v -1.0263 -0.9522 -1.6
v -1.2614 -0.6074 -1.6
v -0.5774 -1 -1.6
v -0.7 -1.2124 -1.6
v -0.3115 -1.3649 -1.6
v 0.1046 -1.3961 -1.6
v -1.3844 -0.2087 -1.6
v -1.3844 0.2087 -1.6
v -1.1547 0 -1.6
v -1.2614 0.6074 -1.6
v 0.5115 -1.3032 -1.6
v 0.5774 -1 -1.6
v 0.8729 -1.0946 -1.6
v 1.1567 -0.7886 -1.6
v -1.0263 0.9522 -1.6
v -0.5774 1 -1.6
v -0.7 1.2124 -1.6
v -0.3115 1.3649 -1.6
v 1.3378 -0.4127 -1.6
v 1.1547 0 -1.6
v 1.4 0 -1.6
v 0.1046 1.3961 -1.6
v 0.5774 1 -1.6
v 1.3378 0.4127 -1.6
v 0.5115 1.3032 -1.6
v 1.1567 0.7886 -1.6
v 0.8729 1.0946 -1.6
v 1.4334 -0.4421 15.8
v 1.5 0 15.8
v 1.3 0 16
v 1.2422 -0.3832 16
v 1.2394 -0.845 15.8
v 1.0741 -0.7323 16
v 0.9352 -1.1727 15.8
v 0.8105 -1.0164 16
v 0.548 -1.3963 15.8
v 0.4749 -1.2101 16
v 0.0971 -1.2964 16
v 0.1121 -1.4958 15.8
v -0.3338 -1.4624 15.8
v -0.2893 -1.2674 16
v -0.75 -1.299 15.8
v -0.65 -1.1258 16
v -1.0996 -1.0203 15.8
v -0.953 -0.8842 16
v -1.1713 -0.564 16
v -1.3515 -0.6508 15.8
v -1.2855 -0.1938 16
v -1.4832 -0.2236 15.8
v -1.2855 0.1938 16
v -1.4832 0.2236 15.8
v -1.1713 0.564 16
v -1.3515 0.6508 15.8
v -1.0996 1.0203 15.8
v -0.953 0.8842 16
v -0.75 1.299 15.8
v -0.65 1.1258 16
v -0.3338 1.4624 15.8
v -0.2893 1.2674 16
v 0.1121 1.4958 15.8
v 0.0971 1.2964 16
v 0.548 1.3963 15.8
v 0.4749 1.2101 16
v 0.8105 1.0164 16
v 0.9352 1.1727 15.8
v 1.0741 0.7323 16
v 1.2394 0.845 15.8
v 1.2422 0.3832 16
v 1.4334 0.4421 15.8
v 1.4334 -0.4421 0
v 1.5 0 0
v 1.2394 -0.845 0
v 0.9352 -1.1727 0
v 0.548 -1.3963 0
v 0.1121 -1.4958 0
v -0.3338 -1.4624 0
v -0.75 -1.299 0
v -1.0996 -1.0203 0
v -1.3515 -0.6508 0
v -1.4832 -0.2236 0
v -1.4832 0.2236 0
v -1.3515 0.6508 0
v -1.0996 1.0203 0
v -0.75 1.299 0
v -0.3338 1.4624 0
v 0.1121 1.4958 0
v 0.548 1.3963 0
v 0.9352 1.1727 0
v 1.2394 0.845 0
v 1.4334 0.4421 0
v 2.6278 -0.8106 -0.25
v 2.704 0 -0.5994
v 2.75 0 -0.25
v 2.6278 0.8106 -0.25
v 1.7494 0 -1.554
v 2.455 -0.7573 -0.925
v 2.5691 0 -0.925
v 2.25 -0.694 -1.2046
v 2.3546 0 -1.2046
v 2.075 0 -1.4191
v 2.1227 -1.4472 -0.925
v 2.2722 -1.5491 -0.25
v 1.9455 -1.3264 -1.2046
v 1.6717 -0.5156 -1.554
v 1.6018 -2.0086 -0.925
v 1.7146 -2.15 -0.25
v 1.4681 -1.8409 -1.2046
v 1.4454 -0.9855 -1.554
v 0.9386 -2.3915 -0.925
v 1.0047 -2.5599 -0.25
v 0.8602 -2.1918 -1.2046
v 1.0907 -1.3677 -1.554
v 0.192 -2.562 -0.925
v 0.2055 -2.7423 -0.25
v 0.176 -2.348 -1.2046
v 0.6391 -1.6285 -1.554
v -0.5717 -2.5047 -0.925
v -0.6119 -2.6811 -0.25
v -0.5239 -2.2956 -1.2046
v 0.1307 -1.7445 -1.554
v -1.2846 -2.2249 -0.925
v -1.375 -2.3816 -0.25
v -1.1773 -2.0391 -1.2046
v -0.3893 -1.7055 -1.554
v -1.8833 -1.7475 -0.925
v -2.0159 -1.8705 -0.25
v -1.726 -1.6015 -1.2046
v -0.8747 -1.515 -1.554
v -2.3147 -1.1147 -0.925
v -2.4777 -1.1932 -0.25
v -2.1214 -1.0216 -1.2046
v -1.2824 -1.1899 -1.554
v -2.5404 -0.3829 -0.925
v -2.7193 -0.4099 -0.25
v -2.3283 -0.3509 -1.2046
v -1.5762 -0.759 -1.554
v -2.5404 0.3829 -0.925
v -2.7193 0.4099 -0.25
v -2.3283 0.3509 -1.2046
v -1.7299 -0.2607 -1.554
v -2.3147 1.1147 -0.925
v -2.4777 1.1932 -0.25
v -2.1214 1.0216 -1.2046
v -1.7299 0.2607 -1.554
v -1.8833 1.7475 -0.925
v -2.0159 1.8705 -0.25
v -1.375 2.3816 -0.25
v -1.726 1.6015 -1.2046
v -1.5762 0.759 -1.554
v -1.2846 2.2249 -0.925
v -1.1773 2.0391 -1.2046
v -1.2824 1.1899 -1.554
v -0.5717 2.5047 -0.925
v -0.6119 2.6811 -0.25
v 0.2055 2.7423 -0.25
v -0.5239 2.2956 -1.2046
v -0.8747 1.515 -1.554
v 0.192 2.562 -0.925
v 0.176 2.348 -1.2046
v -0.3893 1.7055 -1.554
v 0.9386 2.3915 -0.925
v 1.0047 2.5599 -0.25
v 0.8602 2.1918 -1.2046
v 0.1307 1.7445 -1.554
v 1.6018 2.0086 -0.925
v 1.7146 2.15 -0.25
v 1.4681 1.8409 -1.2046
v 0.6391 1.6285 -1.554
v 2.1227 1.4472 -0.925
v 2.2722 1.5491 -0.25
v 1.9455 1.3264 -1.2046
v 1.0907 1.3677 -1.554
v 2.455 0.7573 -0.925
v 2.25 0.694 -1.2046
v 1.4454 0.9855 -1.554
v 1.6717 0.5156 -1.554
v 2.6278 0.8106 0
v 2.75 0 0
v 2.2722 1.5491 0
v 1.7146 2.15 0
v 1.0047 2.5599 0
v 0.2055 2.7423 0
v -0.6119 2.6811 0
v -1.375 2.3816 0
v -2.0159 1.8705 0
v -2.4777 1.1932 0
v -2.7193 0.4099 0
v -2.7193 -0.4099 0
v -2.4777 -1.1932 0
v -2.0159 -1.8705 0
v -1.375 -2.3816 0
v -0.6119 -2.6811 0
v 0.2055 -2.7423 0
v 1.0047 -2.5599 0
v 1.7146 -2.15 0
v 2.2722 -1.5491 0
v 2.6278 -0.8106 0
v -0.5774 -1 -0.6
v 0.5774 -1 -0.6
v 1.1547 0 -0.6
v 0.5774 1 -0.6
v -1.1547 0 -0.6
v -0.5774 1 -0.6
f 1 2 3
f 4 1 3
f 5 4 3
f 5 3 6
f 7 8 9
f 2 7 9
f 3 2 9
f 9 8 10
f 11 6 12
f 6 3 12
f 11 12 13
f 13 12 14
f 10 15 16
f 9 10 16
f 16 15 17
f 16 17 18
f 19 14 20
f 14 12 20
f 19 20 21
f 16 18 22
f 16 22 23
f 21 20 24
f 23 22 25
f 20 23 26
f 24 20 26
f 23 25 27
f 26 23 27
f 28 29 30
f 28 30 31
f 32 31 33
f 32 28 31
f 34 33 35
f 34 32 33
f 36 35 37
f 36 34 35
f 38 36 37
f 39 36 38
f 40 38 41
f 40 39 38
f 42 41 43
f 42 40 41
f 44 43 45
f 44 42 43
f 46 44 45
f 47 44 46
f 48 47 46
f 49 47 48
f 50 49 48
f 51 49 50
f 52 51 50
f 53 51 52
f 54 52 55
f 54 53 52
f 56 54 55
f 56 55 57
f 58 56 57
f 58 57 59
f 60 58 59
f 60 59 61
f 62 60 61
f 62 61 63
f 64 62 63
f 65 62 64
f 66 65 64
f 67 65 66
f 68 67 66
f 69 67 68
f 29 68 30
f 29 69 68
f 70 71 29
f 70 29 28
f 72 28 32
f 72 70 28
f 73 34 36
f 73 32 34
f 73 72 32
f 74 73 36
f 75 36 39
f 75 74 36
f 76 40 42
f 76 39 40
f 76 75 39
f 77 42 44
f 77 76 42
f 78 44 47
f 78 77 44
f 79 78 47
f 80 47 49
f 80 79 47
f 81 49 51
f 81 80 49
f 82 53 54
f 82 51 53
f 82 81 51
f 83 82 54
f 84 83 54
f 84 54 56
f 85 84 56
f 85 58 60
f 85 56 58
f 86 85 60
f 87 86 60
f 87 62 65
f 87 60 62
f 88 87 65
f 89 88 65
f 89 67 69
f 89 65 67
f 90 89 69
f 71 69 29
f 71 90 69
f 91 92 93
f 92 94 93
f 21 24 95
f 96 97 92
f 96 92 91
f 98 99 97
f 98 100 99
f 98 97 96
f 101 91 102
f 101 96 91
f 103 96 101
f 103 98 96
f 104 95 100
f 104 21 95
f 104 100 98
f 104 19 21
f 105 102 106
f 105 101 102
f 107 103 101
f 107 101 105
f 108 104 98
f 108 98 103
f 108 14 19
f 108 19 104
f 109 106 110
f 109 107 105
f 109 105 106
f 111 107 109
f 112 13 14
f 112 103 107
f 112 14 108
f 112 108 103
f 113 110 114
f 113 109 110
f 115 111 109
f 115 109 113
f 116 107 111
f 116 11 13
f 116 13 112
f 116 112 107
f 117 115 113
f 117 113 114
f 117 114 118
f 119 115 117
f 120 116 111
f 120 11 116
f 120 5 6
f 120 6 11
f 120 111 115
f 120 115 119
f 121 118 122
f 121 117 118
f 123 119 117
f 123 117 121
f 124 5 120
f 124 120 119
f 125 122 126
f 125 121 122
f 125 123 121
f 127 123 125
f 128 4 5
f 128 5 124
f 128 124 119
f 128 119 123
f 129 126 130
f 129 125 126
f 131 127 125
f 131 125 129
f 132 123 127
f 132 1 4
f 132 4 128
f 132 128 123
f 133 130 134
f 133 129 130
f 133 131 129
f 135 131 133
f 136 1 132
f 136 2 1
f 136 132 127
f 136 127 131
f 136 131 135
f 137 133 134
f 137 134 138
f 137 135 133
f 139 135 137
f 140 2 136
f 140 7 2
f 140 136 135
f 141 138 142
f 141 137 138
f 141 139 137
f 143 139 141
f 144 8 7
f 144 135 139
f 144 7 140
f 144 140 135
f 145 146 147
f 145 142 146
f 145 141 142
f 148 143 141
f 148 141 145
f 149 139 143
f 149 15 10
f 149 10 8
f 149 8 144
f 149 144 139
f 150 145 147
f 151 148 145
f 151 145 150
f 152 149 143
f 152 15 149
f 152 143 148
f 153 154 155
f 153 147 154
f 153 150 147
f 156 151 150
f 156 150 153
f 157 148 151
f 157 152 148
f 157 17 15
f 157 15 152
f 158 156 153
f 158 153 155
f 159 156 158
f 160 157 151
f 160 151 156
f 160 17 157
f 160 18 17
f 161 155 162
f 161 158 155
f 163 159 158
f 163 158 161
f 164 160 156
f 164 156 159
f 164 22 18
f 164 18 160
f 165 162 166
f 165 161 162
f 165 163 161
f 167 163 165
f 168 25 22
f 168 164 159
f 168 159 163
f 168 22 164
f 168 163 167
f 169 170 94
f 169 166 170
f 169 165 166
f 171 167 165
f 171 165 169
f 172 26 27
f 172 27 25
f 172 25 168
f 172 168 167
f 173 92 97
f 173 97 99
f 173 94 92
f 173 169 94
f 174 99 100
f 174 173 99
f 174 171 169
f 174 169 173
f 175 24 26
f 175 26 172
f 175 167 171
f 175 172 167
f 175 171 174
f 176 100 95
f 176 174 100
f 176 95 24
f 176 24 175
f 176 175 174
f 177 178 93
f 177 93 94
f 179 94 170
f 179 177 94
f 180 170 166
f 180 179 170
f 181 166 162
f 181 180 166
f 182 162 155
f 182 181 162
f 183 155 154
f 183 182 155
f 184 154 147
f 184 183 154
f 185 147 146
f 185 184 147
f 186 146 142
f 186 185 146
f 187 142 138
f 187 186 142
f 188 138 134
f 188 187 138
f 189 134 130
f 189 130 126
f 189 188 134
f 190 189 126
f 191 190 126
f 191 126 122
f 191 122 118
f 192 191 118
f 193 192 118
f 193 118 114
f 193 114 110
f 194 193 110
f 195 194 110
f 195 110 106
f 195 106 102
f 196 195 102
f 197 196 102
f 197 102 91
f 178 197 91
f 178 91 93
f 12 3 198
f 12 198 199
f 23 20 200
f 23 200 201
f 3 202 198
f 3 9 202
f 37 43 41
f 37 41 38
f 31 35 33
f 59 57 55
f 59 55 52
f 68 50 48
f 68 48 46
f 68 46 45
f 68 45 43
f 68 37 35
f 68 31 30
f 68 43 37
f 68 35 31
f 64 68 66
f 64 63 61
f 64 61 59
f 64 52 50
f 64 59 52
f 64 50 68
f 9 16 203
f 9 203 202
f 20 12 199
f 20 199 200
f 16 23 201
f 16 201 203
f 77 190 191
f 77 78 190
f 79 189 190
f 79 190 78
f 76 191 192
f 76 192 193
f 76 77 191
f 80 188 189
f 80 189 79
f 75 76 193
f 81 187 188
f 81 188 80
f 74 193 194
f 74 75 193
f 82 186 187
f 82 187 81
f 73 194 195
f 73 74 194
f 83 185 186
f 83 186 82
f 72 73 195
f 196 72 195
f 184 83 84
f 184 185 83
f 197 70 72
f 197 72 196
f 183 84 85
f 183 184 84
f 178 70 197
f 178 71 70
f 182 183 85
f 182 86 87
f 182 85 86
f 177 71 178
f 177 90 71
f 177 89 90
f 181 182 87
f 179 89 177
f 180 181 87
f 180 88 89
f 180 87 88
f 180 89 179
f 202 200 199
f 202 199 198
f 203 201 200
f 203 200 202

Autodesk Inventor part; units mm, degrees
ref_plane "YZ Plane" through (0, 0, 0) normal (1, 0, 0) x (0, 1, 0)
ref_plane "XZ Plane" through (0, 0, 0) normal (0, 1, 0) x (-1, 0, 0)
ref_plane "XY Plane" through (0, 0, 0) normal (0, 0, 1) x (1, 0, 0)
sketch "Sketch1" plane through (0, 0, 0) normal (0, 0, 1) x (1, 0, 0)
  circle A0 centre (0, 0) radius 1.5
  circle A1 centre (0, 0) radius 2.75
  dimension "d0" = 3
  dimension "d3" = 5.5
extrude "Extrusion1" add sketch "Sketch1" along normal blind 16 contours A0
extrude "Extrusion2" add sketch "Sketch1" against normal blind 1.6 contours A0 | A1
sketch "Sketch2" plane through (0, 0, -1.6) normal (0, 0, -1) x (-1, 0, 0)
  circle A0 centre (0, 0) radius 1
  line L0 (0.5774, 1) -> (1.1547, 0)
  line L1 (1.1547, 0) -> (0.5774, -1)
  line L2 (0.5774, -1) -> (-0.5774, -1)
  line L3 (-0.5774, -1) -> (-1.1547, 0)
  line L4 (-1.1547, 0) -> (-0.5774, 1)
  line L5 (-0.5774, 1) -> (0.5774, 1)
  point P0 (0, 1)
  dimension "d6" = 2
extrude "Extrusion3" cut sketch "Sketch2" against normal blind 1
fillet "Fillet1" radius 1.35 1 edges at (-2.75, 0, -1.6)
thread "Thread1" size "M3x0.5" class "6g" standard "ANSI Metric M Profile" full length
chamfer "Chamfer1" distance 0.2 angle 45 1 edges at (-1.5, 0, 16)
properties part number "COTS_GENERIC_M3x16_screw" material "Steel"
